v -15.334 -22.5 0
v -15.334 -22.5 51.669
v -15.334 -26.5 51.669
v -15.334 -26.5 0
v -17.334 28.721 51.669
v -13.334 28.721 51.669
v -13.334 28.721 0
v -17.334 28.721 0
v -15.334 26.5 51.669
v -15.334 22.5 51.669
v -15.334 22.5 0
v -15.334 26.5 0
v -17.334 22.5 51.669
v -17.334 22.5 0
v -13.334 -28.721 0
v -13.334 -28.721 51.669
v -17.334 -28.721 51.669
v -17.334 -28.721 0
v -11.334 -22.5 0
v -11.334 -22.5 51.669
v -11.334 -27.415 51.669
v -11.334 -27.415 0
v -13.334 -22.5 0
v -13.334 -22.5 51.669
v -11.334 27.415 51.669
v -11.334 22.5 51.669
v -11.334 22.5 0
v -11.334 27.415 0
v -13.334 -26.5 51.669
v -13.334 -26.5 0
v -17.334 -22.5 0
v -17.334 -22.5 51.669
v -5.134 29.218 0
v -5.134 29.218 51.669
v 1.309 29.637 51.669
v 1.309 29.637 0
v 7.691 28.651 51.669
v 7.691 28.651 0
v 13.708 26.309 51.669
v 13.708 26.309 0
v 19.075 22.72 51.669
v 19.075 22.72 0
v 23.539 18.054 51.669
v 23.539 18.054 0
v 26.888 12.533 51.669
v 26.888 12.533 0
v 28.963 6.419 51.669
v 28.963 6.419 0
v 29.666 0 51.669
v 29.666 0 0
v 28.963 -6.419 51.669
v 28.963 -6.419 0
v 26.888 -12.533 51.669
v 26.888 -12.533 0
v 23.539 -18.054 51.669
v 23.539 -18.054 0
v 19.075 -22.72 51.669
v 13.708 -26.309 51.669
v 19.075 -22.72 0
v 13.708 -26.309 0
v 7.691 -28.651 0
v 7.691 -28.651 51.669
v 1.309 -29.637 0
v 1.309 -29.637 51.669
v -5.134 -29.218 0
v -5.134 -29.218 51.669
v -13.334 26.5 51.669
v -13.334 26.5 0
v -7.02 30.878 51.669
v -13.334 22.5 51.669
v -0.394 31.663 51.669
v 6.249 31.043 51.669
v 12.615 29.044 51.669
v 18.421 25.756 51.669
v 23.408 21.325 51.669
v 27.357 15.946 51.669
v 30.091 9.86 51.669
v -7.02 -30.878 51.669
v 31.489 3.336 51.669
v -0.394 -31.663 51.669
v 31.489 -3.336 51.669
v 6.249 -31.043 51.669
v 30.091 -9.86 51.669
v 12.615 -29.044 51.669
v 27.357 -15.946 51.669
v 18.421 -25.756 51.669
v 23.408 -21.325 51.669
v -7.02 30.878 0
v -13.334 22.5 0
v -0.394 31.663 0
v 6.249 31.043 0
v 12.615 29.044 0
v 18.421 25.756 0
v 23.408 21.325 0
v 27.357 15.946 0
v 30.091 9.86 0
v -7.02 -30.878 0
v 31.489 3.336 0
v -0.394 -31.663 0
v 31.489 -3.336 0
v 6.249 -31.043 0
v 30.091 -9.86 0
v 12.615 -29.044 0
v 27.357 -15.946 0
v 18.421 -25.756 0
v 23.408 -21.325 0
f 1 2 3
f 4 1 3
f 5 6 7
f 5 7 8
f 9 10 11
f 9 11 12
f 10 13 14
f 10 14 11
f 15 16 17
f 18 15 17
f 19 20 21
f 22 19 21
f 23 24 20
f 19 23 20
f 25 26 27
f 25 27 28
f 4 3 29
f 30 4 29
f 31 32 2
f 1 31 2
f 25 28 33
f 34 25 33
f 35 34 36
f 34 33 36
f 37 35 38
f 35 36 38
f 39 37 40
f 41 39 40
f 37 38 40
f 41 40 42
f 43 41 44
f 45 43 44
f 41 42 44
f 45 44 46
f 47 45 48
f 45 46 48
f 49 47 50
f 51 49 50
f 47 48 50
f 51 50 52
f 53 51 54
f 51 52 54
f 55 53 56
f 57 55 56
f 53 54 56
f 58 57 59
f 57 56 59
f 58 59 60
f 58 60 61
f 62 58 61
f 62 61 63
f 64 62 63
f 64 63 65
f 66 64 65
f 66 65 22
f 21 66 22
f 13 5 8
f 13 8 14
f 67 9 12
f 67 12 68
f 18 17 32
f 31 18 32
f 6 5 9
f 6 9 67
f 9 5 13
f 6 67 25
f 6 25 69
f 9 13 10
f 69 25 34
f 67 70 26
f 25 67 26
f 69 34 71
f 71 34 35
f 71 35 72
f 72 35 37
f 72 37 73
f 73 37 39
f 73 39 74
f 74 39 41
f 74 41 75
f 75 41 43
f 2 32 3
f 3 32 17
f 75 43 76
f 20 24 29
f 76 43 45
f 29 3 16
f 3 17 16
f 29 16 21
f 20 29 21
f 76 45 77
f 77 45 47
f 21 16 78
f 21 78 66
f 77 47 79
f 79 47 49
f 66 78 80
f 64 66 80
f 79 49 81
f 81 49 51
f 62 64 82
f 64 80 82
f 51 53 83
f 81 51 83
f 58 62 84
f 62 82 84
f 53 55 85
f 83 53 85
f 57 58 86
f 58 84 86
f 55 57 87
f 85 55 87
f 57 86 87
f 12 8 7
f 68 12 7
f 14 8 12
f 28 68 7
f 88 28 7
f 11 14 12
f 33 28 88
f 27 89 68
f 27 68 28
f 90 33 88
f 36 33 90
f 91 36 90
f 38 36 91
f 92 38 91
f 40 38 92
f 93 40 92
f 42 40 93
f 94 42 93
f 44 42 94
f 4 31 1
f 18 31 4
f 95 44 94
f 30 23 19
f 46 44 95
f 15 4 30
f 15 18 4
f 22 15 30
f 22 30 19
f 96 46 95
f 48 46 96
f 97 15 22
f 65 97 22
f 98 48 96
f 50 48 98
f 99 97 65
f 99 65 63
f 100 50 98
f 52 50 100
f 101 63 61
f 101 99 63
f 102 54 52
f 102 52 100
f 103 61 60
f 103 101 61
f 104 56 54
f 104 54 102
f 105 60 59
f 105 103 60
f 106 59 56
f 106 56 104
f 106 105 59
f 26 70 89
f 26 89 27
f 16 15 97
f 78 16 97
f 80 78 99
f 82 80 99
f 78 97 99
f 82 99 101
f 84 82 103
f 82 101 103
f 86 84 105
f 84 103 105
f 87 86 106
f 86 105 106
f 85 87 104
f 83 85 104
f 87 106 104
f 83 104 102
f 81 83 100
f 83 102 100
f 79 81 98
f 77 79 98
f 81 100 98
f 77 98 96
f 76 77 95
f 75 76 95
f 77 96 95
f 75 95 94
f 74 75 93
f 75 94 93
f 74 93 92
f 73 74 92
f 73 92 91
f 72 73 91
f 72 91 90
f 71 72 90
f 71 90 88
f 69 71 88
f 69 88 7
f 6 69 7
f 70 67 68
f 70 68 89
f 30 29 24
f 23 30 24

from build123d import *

# Parameters (mm, degrees)
F1_DEPTH = 51.669
F3_DEPTH = 51.669


with BuildPart() as f1:
    # F0 (on Top) → F1 (new body)
    with BuildSketch(Plane.XY):
        with BuildLine():
            ThreePointArc((-13.334302, 26.5), (29.665698, 0), (-13.334302, -26.5))
            Line((-13.334302, -26.5), (-13.334302, -28.721077))
            ThreePointArc((-13.334302, -28.721077), (31.6655, 0), (-13.334302, 28.721077))
            Line((-13.334302, 28.721077), (-13.334302, 26.5))
        make_face()
    extrude(amount=F1_DEPTH)

    # F2 (on face) → F3 (join)
    with BuildSketch(Plane.XY.offset(51.669)):
        Polygon((-15.334302, 26.5), (-13.334302, 26.5), (-13.334302, 28.721077), (-17.334302, 28.721077), (-17.334302, 26.5), (-17.334302, 22.5), (-15.334302, 22.5), align=None)
        with BuildLine():
            Line((-11.334302, 22.5), (-11.334302, 27.415091))
            ThreePointArc((-11.334302, 27.415091), (-12.342786, 26.976087), (-13.334302, 26.5))
            Line((-13.334302, 26.5), (-13.334302, 22.5))
            Line((-13.334302, 22.5), (-11.334302, 22.5))
        make_face()
    extrude(amount=-F3_DEPTH)

    # F4: F1 across plane


with BuildPart() as f1_1:
    add(f1.part)
    add(f1.part.mirror(Plane.XZ))


solid = f1_1.part
